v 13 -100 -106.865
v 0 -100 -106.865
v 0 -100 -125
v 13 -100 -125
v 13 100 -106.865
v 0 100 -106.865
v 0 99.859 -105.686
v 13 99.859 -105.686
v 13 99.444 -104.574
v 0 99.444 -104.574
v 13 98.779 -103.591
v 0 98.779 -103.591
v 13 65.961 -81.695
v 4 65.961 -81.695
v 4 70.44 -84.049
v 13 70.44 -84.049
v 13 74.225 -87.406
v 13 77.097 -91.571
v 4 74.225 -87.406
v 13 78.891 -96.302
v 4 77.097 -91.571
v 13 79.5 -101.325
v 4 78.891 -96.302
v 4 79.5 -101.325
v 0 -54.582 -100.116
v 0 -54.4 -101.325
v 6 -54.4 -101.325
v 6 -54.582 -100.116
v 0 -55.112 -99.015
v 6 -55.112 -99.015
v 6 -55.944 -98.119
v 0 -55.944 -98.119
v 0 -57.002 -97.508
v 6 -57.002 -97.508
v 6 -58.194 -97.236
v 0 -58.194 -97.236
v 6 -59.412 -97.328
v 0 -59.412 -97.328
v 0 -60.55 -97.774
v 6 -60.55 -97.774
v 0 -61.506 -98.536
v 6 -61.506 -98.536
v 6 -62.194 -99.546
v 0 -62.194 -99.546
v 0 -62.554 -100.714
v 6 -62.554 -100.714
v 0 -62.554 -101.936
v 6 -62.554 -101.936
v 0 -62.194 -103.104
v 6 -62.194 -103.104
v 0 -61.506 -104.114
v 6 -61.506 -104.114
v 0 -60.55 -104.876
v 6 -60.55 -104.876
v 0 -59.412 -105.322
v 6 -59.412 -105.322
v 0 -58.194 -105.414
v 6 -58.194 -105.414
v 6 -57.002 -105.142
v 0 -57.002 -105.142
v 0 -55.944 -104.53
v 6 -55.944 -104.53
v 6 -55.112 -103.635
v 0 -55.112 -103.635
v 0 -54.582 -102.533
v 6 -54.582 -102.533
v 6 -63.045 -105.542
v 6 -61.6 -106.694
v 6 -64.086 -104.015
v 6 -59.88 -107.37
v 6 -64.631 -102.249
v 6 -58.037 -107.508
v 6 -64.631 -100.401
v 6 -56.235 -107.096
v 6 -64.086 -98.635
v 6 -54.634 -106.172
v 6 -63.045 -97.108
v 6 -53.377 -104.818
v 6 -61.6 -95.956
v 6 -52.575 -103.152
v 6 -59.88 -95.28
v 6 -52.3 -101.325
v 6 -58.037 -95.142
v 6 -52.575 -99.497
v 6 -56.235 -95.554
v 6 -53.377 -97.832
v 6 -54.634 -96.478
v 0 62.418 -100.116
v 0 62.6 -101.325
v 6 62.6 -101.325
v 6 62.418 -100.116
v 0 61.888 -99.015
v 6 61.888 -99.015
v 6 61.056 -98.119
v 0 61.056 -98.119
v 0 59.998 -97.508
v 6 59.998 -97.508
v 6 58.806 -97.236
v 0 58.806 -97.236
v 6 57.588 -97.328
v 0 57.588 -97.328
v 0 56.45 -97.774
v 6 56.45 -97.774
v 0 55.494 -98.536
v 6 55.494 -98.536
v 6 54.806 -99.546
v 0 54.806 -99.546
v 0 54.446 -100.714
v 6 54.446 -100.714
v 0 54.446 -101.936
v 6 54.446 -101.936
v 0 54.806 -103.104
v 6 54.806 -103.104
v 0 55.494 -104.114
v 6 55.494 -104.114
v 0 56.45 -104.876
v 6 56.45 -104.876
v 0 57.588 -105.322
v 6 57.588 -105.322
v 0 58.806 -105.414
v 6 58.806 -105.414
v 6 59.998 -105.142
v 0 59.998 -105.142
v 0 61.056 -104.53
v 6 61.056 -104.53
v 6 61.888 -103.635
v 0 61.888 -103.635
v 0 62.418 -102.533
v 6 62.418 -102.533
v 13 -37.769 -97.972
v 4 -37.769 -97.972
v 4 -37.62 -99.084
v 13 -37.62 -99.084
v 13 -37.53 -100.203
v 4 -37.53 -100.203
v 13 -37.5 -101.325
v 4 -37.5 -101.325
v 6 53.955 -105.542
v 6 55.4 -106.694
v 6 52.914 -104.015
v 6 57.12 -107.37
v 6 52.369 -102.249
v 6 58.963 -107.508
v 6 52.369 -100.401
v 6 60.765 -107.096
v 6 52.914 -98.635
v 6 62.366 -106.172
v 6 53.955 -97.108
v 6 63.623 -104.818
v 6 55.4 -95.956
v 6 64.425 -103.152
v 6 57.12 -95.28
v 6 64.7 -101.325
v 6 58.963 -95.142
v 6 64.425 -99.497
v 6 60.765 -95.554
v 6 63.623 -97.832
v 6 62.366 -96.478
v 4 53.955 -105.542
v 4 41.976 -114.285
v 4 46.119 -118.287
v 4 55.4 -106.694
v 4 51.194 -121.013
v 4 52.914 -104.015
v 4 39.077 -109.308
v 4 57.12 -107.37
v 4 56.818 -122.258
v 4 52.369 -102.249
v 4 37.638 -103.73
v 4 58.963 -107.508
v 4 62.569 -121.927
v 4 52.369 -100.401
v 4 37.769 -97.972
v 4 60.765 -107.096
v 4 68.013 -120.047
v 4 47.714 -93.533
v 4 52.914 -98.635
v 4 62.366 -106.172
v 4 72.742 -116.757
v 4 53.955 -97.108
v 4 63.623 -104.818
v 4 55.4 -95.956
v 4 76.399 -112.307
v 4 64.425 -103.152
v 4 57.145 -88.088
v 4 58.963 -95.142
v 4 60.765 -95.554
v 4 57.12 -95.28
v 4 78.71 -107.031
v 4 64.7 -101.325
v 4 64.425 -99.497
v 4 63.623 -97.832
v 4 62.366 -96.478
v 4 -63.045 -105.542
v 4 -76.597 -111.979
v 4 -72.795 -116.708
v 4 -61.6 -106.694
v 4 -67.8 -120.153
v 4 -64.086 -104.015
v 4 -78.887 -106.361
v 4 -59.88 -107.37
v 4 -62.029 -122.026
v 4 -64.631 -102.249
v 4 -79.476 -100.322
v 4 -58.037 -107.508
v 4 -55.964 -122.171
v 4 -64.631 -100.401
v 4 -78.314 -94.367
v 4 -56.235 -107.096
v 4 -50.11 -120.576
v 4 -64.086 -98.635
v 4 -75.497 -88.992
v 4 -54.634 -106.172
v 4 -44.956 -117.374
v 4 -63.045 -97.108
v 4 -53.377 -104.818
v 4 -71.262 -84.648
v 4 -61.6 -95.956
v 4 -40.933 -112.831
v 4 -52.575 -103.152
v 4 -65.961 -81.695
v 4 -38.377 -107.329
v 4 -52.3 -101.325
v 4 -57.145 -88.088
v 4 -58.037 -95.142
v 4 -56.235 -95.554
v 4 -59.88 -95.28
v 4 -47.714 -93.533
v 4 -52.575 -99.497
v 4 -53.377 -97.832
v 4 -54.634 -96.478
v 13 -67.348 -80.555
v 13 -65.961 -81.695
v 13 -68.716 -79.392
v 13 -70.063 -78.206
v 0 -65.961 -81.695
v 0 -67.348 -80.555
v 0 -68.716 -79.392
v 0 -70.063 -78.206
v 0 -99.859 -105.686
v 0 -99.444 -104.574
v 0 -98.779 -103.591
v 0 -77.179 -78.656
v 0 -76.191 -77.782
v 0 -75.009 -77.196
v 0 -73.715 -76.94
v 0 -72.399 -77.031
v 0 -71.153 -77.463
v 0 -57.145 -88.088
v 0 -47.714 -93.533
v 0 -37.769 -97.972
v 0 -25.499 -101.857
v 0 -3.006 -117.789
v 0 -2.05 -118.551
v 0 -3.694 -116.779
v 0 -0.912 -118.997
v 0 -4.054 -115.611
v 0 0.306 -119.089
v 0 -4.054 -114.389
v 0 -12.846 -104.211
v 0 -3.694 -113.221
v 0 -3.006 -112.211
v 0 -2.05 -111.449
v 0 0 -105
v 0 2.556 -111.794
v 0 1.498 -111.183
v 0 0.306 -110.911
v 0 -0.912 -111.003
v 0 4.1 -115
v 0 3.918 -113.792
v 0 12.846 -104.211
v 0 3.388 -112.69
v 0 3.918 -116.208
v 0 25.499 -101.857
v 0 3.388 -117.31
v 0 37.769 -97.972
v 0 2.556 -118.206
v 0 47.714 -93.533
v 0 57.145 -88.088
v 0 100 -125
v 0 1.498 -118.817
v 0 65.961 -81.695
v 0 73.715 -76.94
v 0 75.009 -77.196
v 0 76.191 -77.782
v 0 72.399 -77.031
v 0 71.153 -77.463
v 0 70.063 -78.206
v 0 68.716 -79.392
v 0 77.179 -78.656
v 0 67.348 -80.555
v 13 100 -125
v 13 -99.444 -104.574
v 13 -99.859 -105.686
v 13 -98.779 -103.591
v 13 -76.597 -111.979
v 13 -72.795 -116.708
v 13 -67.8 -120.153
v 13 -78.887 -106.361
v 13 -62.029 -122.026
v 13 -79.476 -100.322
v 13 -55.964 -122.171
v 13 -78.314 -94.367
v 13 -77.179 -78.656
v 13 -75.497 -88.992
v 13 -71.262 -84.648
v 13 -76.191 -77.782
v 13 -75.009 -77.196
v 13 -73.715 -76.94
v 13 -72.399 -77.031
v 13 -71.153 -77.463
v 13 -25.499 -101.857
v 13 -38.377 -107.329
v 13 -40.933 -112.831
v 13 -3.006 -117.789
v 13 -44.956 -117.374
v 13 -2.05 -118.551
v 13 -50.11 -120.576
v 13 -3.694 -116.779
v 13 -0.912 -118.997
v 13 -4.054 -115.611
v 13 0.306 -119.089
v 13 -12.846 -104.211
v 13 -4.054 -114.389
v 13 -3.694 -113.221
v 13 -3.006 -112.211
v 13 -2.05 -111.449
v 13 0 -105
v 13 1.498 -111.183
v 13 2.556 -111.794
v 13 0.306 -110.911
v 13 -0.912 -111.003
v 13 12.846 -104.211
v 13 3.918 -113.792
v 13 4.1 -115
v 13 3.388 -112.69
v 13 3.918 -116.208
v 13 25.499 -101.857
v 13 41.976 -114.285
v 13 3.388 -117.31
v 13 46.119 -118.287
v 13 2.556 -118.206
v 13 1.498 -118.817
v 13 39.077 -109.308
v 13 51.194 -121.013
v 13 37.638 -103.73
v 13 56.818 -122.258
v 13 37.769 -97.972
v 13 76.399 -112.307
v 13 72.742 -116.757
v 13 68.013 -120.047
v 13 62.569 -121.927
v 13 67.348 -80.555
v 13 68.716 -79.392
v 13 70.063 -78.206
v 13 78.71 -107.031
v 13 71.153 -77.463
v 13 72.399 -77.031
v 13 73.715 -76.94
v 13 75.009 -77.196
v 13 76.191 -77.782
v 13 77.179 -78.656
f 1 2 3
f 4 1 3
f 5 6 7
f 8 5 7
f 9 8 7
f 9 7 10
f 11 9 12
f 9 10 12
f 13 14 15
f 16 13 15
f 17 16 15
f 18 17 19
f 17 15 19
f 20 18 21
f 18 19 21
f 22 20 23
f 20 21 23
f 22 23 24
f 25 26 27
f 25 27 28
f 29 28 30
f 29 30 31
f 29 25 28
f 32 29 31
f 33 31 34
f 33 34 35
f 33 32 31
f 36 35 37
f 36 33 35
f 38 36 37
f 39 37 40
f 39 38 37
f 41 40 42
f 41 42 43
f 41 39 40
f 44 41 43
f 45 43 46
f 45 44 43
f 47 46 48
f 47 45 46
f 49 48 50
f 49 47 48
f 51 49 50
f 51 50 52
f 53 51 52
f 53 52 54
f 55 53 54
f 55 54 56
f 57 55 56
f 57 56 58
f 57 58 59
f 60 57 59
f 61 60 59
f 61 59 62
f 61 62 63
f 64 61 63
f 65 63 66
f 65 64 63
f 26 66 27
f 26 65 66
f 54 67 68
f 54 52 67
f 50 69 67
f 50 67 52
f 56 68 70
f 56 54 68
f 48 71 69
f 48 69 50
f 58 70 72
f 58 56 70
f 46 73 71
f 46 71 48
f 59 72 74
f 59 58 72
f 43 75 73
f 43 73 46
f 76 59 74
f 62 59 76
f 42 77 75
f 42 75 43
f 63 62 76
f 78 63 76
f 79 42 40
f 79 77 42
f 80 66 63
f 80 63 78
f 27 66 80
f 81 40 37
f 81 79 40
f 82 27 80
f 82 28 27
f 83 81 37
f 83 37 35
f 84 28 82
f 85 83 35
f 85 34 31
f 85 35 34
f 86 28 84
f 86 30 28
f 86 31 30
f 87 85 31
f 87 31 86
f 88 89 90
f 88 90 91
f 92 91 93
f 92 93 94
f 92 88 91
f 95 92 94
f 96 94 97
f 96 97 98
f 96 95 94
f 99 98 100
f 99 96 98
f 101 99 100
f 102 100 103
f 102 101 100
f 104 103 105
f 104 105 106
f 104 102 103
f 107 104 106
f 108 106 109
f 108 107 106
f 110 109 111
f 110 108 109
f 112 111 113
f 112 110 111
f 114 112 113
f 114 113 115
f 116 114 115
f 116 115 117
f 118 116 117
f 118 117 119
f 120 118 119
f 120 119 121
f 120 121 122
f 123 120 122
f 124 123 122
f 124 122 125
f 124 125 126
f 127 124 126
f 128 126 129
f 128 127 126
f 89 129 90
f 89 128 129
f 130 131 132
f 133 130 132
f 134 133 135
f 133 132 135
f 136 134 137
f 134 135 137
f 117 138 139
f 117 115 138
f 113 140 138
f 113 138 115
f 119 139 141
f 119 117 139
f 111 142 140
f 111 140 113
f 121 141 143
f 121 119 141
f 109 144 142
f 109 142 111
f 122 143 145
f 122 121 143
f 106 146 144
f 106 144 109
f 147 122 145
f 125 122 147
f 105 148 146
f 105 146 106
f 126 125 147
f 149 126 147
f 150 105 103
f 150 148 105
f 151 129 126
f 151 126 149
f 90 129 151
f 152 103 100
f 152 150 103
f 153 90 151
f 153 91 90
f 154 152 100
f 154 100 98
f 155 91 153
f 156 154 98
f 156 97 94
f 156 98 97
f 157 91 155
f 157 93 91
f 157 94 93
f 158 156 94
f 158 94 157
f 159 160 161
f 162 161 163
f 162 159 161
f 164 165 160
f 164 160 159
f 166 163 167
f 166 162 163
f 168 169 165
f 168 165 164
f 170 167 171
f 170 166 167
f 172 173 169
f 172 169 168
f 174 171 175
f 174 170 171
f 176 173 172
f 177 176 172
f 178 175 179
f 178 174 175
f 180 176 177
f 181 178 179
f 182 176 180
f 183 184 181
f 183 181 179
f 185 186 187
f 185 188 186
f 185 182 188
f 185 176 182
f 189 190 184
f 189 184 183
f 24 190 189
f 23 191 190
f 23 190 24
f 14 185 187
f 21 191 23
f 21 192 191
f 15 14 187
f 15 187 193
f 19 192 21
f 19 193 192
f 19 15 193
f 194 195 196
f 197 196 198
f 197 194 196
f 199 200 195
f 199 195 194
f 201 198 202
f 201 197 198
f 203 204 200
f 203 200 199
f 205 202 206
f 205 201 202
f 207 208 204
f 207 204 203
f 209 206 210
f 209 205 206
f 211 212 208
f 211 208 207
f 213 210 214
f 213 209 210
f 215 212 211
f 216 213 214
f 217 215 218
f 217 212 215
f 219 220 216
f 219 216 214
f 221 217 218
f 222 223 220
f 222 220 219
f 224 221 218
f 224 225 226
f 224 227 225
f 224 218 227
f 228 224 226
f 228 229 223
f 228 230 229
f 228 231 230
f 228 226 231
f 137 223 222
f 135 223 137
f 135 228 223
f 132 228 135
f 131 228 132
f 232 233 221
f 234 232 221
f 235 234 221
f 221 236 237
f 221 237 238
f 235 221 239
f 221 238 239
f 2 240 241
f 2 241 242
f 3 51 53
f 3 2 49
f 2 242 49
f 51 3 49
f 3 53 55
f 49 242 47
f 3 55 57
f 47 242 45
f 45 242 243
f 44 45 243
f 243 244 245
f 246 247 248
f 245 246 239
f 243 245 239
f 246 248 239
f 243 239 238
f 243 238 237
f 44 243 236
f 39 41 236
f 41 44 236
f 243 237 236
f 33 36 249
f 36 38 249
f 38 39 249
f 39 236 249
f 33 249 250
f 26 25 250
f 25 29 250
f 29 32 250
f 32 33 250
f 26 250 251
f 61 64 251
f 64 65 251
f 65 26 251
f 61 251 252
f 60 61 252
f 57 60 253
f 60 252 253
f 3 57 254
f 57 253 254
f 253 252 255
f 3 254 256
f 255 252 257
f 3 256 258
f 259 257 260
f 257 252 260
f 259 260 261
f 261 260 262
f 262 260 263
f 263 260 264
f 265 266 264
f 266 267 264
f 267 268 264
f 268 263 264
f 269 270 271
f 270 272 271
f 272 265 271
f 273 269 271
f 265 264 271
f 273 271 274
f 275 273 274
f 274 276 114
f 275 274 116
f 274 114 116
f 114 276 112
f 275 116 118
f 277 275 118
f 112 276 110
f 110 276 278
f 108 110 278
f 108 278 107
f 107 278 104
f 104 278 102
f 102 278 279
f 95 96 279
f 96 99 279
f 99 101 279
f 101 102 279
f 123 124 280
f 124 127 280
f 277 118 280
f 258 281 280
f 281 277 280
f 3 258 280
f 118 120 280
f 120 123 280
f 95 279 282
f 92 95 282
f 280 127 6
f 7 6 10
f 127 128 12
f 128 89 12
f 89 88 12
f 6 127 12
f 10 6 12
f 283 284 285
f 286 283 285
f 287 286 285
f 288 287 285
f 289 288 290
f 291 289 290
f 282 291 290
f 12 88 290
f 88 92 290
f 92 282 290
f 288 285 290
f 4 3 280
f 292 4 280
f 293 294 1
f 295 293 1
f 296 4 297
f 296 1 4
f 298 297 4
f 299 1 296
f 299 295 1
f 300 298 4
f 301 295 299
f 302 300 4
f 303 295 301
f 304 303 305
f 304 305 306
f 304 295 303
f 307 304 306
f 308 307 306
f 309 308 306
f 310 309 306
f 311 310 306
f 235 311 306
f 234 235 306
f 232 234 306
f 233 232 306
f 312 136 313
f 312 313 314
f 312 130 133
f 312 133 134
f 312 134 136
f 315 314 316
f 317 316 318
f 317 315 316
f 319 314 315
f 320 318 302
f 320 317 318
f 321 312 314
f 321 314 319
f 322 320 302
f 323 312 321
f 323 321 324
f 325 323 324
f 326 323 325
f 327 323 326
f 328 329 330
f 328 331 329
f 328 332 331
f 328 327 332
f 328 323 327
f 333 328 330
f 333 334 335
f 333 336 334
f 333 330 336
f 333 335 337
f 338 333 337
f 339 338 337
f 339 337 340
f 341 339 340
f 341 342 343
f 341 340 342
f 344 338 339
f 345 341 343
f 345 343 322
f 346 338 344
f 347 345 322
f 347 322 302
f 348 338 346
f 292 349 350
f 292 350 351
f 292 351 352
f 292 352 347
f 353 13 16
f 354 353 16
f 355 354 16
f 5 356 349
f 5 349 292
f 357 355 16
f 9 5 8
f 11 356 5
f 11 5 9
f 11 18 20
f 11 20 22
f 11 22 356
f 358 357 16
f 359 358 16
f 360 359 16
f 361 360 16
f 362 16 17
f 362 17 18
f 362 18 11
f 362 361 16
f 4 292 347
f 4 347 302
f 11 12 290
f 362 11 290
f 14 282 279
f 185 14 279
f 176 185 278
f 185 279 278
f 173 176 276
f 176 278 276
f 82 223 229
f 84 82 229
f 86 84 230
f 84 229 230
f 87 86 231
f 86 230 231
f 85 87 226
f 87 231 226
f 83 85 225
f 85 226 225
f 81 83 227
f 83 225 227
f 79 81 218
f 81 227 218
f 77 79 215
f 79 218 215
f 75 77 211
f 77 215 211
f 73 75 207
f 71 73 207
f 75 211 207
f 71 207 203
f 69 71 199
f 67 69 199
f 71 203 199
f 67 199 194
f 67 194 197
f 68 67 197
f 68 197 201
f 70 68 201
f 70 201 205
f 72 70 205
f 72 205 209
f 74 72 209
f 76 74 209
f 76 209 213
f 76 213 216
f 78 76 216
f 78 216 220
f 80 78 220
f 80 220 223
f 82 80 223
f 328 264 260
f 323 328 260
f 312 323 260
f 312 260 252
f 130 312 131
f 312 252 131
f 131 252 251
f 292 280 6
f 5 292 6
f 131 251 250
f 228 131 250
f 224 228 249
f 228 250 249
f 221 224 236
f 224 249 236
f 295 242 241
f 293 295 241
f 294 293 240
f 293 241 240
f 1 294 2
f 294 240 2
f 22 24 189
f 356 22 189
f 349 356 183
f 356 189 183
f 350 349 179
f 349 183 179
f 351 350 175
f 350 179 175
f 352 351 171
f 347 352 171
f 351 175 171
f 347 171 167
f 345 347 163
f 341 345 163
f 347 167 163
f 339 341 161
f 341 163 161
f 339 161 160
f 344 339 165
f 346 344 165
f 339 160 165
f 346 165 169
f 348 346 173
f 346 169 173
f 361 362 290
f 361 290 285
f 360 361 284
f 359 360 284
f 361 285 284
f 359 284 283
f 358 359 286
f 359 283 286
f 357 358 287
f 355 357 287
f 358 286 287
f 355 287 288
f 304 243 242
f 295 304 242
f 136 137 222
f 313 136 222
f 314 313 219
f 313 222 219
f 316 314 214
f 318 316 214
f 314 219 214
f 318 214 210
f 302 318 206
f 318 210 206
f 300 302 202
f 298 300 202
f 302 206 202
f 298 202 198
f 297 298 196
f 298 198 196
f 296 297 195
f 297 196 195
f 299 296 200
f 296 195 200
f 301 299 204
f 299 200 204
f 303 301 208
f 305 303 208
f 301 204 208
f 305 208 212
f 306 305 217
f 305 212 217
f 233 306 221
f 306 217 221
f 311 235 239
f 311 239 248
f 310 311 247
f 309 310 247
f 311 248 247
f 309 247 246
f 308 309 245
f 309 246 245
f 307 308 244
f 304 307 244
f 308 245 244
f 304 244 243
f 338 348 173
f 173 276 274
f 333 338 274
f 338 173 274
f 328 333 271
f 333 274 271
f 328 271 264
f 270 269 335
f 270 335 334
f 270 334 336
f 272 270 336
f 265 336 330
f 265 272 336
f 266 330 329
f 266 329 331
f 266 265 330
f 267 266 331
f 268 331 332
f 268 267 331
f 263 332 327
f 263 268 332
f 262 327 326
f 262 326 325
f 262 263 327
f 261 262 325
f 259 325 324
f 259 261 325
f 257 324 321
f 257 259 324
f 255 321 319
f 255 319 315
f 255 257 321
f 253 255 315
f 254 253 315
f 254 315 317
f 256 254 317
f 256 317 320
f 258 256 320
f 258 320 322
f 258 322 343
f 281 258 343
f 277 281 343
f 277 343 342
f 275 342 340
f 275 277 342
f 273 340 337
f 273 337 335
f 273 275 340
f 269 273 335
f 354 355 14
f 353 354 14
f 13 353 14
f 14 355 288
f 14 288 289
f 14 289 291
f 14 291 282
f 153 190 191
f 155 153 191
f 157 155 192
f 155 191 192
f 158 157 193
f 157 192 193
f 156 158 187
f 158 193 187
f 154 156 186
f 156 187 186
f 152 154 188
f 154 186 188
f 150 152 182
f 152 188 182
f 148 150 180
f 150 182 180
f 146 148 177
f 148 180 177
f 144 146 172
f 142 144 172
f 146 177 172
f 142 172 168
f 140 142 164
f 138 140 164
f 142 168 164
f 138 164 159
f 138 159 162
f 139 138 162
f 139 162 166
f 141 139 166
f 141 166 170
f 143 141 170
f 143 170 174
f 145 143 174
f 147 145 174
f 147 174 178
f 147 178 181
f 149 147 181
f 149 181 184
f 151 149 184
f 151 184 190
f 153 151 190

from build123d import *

# Parameters (mm, degrees)
F0_R     = 6.2
F0_R_2   = 4.1
F1_DEPTH = 6
F2_DEPTH = 4
F3_DEPTH = 13


with BuildPart() as f1:
    # F0 (on Right) → F1 (new body)
    with BuildSketch(Plane.YZ):
        with Locations((58.5, -101.3249722428)):
            Circle(F0_R)
        with Locations((58.5, -101.3249722428)):
            Circle(F0_R_2, mode=Mode.SUBTRACT)
    extrude(amount=F1_DEPTH)

    # F0 (on Right) → F2, piece 2 (join)
    with BuildSketch(Plane.YZ):
        with BuildLine():
            ThreePointArc((79.5, -101.3249722428), (75.7871035755, -89.4020510416), (65.9613285744, -81.6951842687))
            ThreePointArc((65.9613285744, -81.6951842687), (52.5, -90.9326673974), (37.7694406564, -97.9717783471))
            ThreePointArc((37.7694406564, -97.9717783471), (56.8179991402, -122.2575036976), (79.5, -101.3249722428))
        make_face()
        with Locations((58.5, -101.3249722428)):
            Circle(F0_R, mode=Mode.SUBTRACT)
    extrude(amount=F2_DEPTH)



with BuildPart() as f1b:
    # F0 (on Right) → F1, piece 2 (new body)
    with BuildSketch(Plane.YZ):
        with Locations((-58.5, -101.3249722428)):
            Circle(F0_R)
        with Locations((-58.5, -101.3249722428)):
            Circle(F0_R_2, mode=Mode.SUBTRACT)
    extrude(amount=F1_DEPTH)

    # F0 (on Right) → F2 (join)
    with BuildSketch(Plane.YZ):
        with BuildLine():
            ThreePointArc((-37.7694406564, -97.9717783471), (-52.5, -90.9326673974), (-65.9613285744, -81.6951842687))
            ThreePointArc((-65.9613285744, -81.6951842687), (-70.4229212012, -118.6120758183), (-37.5, -101.3249722428))
            ThreePointArc((-37.5, -101.3249722428), (-37.5674685452, -99.642971383), (-37.7694406564, -97.9717783471))
        make_face()
        with Locations((-58.5, -101.3249722428)):
            Circle(F0_R, mode=Mode.SUBTRACT)
    extrude(amount=F2_DEPTH)


with BuildPart() as f1_1:
    add(f1.part)

    add(f1b.part)  # F3 merges F1b
    # F0 (on Right) → F3 (join)
    with BuildSketch(Plane.YZ):
        with BuildLine():
            ThreePointArc((-37.5, -101.3249722428), (-70.4229212012, -118.6120758183), (-65.9613285744, -81.6951842687))
            ThreePointArc((-65.9613285744, -81.6951842687), (-68.0346725838, -79.9767674166), (-70.0632666757, -78.2057457143))
            ThreePointArc((-70.0632666757, -78.2057457143), (-73.7153806196, -76.9398097428), (-77.1787849633, -78.6560150029))
            Line((-77.1787849633, -78.6560150029), (-98.7791722555, -103.5907206196))
            ThreePointArc((-98.7791722555, -103.5907206196), (-99.6848618591, -105.1175171847), (-100, -106.8645344603))
            Line((-100, -106.8645344603), (-100, -125))
            Line((-100, -125), (0, -125))
            Line((0, -125), (100, -125))
            Line((100, -125), (100, -106.8645344603))
            ThreePointArc((100, -106.8645344603), (99.6848618591, -105.1175171847), (98.7791722555, -103.5907206196))
            Line((98.7791722555, -103.5907206196), (77.1787849633, -78.6560150029))
            ThreePointArc((77.1787849633, -78.6560150029), (73.7153806196, -76.9398097428), (70.0632666757, -78.2057457143))
            ThreePointArc((70.0632666757, -78.2057457143), (68.0346725838, -79.9767674166), (65.9613285744, -81.6951842687))
            ThreePointArc((65.9613285744, -81.6951842687), (75.7871035755, -89.4020510416), (79.5, -101.3249722428))
            ThreePointArc((79.5, -101.3249722428), (56.8179991402, -122.2575036976), (37.7694406564, -97.9717783471))
            ThreePointArc((37.7694406564, -97.9717783471), (19.2088947307, -103.2279921495), (0, -105))
            ThreePointArc((0, -105), (-19.2088947307, -103.2279921495), (-37.7694406564, -97.9717783471))
            ThreePointArc((-37.7694406564, -97.9717783471), (-37.5674685452, -99.642971383), (-37.5, -101.3249722428))
        make_face()
        with Locations((0, -115)):
            Circle(F0_R_2, mode=Mode.SUBTRACT)
    extrude(amount=F3_DEPTH)


solid = f1_1.part
